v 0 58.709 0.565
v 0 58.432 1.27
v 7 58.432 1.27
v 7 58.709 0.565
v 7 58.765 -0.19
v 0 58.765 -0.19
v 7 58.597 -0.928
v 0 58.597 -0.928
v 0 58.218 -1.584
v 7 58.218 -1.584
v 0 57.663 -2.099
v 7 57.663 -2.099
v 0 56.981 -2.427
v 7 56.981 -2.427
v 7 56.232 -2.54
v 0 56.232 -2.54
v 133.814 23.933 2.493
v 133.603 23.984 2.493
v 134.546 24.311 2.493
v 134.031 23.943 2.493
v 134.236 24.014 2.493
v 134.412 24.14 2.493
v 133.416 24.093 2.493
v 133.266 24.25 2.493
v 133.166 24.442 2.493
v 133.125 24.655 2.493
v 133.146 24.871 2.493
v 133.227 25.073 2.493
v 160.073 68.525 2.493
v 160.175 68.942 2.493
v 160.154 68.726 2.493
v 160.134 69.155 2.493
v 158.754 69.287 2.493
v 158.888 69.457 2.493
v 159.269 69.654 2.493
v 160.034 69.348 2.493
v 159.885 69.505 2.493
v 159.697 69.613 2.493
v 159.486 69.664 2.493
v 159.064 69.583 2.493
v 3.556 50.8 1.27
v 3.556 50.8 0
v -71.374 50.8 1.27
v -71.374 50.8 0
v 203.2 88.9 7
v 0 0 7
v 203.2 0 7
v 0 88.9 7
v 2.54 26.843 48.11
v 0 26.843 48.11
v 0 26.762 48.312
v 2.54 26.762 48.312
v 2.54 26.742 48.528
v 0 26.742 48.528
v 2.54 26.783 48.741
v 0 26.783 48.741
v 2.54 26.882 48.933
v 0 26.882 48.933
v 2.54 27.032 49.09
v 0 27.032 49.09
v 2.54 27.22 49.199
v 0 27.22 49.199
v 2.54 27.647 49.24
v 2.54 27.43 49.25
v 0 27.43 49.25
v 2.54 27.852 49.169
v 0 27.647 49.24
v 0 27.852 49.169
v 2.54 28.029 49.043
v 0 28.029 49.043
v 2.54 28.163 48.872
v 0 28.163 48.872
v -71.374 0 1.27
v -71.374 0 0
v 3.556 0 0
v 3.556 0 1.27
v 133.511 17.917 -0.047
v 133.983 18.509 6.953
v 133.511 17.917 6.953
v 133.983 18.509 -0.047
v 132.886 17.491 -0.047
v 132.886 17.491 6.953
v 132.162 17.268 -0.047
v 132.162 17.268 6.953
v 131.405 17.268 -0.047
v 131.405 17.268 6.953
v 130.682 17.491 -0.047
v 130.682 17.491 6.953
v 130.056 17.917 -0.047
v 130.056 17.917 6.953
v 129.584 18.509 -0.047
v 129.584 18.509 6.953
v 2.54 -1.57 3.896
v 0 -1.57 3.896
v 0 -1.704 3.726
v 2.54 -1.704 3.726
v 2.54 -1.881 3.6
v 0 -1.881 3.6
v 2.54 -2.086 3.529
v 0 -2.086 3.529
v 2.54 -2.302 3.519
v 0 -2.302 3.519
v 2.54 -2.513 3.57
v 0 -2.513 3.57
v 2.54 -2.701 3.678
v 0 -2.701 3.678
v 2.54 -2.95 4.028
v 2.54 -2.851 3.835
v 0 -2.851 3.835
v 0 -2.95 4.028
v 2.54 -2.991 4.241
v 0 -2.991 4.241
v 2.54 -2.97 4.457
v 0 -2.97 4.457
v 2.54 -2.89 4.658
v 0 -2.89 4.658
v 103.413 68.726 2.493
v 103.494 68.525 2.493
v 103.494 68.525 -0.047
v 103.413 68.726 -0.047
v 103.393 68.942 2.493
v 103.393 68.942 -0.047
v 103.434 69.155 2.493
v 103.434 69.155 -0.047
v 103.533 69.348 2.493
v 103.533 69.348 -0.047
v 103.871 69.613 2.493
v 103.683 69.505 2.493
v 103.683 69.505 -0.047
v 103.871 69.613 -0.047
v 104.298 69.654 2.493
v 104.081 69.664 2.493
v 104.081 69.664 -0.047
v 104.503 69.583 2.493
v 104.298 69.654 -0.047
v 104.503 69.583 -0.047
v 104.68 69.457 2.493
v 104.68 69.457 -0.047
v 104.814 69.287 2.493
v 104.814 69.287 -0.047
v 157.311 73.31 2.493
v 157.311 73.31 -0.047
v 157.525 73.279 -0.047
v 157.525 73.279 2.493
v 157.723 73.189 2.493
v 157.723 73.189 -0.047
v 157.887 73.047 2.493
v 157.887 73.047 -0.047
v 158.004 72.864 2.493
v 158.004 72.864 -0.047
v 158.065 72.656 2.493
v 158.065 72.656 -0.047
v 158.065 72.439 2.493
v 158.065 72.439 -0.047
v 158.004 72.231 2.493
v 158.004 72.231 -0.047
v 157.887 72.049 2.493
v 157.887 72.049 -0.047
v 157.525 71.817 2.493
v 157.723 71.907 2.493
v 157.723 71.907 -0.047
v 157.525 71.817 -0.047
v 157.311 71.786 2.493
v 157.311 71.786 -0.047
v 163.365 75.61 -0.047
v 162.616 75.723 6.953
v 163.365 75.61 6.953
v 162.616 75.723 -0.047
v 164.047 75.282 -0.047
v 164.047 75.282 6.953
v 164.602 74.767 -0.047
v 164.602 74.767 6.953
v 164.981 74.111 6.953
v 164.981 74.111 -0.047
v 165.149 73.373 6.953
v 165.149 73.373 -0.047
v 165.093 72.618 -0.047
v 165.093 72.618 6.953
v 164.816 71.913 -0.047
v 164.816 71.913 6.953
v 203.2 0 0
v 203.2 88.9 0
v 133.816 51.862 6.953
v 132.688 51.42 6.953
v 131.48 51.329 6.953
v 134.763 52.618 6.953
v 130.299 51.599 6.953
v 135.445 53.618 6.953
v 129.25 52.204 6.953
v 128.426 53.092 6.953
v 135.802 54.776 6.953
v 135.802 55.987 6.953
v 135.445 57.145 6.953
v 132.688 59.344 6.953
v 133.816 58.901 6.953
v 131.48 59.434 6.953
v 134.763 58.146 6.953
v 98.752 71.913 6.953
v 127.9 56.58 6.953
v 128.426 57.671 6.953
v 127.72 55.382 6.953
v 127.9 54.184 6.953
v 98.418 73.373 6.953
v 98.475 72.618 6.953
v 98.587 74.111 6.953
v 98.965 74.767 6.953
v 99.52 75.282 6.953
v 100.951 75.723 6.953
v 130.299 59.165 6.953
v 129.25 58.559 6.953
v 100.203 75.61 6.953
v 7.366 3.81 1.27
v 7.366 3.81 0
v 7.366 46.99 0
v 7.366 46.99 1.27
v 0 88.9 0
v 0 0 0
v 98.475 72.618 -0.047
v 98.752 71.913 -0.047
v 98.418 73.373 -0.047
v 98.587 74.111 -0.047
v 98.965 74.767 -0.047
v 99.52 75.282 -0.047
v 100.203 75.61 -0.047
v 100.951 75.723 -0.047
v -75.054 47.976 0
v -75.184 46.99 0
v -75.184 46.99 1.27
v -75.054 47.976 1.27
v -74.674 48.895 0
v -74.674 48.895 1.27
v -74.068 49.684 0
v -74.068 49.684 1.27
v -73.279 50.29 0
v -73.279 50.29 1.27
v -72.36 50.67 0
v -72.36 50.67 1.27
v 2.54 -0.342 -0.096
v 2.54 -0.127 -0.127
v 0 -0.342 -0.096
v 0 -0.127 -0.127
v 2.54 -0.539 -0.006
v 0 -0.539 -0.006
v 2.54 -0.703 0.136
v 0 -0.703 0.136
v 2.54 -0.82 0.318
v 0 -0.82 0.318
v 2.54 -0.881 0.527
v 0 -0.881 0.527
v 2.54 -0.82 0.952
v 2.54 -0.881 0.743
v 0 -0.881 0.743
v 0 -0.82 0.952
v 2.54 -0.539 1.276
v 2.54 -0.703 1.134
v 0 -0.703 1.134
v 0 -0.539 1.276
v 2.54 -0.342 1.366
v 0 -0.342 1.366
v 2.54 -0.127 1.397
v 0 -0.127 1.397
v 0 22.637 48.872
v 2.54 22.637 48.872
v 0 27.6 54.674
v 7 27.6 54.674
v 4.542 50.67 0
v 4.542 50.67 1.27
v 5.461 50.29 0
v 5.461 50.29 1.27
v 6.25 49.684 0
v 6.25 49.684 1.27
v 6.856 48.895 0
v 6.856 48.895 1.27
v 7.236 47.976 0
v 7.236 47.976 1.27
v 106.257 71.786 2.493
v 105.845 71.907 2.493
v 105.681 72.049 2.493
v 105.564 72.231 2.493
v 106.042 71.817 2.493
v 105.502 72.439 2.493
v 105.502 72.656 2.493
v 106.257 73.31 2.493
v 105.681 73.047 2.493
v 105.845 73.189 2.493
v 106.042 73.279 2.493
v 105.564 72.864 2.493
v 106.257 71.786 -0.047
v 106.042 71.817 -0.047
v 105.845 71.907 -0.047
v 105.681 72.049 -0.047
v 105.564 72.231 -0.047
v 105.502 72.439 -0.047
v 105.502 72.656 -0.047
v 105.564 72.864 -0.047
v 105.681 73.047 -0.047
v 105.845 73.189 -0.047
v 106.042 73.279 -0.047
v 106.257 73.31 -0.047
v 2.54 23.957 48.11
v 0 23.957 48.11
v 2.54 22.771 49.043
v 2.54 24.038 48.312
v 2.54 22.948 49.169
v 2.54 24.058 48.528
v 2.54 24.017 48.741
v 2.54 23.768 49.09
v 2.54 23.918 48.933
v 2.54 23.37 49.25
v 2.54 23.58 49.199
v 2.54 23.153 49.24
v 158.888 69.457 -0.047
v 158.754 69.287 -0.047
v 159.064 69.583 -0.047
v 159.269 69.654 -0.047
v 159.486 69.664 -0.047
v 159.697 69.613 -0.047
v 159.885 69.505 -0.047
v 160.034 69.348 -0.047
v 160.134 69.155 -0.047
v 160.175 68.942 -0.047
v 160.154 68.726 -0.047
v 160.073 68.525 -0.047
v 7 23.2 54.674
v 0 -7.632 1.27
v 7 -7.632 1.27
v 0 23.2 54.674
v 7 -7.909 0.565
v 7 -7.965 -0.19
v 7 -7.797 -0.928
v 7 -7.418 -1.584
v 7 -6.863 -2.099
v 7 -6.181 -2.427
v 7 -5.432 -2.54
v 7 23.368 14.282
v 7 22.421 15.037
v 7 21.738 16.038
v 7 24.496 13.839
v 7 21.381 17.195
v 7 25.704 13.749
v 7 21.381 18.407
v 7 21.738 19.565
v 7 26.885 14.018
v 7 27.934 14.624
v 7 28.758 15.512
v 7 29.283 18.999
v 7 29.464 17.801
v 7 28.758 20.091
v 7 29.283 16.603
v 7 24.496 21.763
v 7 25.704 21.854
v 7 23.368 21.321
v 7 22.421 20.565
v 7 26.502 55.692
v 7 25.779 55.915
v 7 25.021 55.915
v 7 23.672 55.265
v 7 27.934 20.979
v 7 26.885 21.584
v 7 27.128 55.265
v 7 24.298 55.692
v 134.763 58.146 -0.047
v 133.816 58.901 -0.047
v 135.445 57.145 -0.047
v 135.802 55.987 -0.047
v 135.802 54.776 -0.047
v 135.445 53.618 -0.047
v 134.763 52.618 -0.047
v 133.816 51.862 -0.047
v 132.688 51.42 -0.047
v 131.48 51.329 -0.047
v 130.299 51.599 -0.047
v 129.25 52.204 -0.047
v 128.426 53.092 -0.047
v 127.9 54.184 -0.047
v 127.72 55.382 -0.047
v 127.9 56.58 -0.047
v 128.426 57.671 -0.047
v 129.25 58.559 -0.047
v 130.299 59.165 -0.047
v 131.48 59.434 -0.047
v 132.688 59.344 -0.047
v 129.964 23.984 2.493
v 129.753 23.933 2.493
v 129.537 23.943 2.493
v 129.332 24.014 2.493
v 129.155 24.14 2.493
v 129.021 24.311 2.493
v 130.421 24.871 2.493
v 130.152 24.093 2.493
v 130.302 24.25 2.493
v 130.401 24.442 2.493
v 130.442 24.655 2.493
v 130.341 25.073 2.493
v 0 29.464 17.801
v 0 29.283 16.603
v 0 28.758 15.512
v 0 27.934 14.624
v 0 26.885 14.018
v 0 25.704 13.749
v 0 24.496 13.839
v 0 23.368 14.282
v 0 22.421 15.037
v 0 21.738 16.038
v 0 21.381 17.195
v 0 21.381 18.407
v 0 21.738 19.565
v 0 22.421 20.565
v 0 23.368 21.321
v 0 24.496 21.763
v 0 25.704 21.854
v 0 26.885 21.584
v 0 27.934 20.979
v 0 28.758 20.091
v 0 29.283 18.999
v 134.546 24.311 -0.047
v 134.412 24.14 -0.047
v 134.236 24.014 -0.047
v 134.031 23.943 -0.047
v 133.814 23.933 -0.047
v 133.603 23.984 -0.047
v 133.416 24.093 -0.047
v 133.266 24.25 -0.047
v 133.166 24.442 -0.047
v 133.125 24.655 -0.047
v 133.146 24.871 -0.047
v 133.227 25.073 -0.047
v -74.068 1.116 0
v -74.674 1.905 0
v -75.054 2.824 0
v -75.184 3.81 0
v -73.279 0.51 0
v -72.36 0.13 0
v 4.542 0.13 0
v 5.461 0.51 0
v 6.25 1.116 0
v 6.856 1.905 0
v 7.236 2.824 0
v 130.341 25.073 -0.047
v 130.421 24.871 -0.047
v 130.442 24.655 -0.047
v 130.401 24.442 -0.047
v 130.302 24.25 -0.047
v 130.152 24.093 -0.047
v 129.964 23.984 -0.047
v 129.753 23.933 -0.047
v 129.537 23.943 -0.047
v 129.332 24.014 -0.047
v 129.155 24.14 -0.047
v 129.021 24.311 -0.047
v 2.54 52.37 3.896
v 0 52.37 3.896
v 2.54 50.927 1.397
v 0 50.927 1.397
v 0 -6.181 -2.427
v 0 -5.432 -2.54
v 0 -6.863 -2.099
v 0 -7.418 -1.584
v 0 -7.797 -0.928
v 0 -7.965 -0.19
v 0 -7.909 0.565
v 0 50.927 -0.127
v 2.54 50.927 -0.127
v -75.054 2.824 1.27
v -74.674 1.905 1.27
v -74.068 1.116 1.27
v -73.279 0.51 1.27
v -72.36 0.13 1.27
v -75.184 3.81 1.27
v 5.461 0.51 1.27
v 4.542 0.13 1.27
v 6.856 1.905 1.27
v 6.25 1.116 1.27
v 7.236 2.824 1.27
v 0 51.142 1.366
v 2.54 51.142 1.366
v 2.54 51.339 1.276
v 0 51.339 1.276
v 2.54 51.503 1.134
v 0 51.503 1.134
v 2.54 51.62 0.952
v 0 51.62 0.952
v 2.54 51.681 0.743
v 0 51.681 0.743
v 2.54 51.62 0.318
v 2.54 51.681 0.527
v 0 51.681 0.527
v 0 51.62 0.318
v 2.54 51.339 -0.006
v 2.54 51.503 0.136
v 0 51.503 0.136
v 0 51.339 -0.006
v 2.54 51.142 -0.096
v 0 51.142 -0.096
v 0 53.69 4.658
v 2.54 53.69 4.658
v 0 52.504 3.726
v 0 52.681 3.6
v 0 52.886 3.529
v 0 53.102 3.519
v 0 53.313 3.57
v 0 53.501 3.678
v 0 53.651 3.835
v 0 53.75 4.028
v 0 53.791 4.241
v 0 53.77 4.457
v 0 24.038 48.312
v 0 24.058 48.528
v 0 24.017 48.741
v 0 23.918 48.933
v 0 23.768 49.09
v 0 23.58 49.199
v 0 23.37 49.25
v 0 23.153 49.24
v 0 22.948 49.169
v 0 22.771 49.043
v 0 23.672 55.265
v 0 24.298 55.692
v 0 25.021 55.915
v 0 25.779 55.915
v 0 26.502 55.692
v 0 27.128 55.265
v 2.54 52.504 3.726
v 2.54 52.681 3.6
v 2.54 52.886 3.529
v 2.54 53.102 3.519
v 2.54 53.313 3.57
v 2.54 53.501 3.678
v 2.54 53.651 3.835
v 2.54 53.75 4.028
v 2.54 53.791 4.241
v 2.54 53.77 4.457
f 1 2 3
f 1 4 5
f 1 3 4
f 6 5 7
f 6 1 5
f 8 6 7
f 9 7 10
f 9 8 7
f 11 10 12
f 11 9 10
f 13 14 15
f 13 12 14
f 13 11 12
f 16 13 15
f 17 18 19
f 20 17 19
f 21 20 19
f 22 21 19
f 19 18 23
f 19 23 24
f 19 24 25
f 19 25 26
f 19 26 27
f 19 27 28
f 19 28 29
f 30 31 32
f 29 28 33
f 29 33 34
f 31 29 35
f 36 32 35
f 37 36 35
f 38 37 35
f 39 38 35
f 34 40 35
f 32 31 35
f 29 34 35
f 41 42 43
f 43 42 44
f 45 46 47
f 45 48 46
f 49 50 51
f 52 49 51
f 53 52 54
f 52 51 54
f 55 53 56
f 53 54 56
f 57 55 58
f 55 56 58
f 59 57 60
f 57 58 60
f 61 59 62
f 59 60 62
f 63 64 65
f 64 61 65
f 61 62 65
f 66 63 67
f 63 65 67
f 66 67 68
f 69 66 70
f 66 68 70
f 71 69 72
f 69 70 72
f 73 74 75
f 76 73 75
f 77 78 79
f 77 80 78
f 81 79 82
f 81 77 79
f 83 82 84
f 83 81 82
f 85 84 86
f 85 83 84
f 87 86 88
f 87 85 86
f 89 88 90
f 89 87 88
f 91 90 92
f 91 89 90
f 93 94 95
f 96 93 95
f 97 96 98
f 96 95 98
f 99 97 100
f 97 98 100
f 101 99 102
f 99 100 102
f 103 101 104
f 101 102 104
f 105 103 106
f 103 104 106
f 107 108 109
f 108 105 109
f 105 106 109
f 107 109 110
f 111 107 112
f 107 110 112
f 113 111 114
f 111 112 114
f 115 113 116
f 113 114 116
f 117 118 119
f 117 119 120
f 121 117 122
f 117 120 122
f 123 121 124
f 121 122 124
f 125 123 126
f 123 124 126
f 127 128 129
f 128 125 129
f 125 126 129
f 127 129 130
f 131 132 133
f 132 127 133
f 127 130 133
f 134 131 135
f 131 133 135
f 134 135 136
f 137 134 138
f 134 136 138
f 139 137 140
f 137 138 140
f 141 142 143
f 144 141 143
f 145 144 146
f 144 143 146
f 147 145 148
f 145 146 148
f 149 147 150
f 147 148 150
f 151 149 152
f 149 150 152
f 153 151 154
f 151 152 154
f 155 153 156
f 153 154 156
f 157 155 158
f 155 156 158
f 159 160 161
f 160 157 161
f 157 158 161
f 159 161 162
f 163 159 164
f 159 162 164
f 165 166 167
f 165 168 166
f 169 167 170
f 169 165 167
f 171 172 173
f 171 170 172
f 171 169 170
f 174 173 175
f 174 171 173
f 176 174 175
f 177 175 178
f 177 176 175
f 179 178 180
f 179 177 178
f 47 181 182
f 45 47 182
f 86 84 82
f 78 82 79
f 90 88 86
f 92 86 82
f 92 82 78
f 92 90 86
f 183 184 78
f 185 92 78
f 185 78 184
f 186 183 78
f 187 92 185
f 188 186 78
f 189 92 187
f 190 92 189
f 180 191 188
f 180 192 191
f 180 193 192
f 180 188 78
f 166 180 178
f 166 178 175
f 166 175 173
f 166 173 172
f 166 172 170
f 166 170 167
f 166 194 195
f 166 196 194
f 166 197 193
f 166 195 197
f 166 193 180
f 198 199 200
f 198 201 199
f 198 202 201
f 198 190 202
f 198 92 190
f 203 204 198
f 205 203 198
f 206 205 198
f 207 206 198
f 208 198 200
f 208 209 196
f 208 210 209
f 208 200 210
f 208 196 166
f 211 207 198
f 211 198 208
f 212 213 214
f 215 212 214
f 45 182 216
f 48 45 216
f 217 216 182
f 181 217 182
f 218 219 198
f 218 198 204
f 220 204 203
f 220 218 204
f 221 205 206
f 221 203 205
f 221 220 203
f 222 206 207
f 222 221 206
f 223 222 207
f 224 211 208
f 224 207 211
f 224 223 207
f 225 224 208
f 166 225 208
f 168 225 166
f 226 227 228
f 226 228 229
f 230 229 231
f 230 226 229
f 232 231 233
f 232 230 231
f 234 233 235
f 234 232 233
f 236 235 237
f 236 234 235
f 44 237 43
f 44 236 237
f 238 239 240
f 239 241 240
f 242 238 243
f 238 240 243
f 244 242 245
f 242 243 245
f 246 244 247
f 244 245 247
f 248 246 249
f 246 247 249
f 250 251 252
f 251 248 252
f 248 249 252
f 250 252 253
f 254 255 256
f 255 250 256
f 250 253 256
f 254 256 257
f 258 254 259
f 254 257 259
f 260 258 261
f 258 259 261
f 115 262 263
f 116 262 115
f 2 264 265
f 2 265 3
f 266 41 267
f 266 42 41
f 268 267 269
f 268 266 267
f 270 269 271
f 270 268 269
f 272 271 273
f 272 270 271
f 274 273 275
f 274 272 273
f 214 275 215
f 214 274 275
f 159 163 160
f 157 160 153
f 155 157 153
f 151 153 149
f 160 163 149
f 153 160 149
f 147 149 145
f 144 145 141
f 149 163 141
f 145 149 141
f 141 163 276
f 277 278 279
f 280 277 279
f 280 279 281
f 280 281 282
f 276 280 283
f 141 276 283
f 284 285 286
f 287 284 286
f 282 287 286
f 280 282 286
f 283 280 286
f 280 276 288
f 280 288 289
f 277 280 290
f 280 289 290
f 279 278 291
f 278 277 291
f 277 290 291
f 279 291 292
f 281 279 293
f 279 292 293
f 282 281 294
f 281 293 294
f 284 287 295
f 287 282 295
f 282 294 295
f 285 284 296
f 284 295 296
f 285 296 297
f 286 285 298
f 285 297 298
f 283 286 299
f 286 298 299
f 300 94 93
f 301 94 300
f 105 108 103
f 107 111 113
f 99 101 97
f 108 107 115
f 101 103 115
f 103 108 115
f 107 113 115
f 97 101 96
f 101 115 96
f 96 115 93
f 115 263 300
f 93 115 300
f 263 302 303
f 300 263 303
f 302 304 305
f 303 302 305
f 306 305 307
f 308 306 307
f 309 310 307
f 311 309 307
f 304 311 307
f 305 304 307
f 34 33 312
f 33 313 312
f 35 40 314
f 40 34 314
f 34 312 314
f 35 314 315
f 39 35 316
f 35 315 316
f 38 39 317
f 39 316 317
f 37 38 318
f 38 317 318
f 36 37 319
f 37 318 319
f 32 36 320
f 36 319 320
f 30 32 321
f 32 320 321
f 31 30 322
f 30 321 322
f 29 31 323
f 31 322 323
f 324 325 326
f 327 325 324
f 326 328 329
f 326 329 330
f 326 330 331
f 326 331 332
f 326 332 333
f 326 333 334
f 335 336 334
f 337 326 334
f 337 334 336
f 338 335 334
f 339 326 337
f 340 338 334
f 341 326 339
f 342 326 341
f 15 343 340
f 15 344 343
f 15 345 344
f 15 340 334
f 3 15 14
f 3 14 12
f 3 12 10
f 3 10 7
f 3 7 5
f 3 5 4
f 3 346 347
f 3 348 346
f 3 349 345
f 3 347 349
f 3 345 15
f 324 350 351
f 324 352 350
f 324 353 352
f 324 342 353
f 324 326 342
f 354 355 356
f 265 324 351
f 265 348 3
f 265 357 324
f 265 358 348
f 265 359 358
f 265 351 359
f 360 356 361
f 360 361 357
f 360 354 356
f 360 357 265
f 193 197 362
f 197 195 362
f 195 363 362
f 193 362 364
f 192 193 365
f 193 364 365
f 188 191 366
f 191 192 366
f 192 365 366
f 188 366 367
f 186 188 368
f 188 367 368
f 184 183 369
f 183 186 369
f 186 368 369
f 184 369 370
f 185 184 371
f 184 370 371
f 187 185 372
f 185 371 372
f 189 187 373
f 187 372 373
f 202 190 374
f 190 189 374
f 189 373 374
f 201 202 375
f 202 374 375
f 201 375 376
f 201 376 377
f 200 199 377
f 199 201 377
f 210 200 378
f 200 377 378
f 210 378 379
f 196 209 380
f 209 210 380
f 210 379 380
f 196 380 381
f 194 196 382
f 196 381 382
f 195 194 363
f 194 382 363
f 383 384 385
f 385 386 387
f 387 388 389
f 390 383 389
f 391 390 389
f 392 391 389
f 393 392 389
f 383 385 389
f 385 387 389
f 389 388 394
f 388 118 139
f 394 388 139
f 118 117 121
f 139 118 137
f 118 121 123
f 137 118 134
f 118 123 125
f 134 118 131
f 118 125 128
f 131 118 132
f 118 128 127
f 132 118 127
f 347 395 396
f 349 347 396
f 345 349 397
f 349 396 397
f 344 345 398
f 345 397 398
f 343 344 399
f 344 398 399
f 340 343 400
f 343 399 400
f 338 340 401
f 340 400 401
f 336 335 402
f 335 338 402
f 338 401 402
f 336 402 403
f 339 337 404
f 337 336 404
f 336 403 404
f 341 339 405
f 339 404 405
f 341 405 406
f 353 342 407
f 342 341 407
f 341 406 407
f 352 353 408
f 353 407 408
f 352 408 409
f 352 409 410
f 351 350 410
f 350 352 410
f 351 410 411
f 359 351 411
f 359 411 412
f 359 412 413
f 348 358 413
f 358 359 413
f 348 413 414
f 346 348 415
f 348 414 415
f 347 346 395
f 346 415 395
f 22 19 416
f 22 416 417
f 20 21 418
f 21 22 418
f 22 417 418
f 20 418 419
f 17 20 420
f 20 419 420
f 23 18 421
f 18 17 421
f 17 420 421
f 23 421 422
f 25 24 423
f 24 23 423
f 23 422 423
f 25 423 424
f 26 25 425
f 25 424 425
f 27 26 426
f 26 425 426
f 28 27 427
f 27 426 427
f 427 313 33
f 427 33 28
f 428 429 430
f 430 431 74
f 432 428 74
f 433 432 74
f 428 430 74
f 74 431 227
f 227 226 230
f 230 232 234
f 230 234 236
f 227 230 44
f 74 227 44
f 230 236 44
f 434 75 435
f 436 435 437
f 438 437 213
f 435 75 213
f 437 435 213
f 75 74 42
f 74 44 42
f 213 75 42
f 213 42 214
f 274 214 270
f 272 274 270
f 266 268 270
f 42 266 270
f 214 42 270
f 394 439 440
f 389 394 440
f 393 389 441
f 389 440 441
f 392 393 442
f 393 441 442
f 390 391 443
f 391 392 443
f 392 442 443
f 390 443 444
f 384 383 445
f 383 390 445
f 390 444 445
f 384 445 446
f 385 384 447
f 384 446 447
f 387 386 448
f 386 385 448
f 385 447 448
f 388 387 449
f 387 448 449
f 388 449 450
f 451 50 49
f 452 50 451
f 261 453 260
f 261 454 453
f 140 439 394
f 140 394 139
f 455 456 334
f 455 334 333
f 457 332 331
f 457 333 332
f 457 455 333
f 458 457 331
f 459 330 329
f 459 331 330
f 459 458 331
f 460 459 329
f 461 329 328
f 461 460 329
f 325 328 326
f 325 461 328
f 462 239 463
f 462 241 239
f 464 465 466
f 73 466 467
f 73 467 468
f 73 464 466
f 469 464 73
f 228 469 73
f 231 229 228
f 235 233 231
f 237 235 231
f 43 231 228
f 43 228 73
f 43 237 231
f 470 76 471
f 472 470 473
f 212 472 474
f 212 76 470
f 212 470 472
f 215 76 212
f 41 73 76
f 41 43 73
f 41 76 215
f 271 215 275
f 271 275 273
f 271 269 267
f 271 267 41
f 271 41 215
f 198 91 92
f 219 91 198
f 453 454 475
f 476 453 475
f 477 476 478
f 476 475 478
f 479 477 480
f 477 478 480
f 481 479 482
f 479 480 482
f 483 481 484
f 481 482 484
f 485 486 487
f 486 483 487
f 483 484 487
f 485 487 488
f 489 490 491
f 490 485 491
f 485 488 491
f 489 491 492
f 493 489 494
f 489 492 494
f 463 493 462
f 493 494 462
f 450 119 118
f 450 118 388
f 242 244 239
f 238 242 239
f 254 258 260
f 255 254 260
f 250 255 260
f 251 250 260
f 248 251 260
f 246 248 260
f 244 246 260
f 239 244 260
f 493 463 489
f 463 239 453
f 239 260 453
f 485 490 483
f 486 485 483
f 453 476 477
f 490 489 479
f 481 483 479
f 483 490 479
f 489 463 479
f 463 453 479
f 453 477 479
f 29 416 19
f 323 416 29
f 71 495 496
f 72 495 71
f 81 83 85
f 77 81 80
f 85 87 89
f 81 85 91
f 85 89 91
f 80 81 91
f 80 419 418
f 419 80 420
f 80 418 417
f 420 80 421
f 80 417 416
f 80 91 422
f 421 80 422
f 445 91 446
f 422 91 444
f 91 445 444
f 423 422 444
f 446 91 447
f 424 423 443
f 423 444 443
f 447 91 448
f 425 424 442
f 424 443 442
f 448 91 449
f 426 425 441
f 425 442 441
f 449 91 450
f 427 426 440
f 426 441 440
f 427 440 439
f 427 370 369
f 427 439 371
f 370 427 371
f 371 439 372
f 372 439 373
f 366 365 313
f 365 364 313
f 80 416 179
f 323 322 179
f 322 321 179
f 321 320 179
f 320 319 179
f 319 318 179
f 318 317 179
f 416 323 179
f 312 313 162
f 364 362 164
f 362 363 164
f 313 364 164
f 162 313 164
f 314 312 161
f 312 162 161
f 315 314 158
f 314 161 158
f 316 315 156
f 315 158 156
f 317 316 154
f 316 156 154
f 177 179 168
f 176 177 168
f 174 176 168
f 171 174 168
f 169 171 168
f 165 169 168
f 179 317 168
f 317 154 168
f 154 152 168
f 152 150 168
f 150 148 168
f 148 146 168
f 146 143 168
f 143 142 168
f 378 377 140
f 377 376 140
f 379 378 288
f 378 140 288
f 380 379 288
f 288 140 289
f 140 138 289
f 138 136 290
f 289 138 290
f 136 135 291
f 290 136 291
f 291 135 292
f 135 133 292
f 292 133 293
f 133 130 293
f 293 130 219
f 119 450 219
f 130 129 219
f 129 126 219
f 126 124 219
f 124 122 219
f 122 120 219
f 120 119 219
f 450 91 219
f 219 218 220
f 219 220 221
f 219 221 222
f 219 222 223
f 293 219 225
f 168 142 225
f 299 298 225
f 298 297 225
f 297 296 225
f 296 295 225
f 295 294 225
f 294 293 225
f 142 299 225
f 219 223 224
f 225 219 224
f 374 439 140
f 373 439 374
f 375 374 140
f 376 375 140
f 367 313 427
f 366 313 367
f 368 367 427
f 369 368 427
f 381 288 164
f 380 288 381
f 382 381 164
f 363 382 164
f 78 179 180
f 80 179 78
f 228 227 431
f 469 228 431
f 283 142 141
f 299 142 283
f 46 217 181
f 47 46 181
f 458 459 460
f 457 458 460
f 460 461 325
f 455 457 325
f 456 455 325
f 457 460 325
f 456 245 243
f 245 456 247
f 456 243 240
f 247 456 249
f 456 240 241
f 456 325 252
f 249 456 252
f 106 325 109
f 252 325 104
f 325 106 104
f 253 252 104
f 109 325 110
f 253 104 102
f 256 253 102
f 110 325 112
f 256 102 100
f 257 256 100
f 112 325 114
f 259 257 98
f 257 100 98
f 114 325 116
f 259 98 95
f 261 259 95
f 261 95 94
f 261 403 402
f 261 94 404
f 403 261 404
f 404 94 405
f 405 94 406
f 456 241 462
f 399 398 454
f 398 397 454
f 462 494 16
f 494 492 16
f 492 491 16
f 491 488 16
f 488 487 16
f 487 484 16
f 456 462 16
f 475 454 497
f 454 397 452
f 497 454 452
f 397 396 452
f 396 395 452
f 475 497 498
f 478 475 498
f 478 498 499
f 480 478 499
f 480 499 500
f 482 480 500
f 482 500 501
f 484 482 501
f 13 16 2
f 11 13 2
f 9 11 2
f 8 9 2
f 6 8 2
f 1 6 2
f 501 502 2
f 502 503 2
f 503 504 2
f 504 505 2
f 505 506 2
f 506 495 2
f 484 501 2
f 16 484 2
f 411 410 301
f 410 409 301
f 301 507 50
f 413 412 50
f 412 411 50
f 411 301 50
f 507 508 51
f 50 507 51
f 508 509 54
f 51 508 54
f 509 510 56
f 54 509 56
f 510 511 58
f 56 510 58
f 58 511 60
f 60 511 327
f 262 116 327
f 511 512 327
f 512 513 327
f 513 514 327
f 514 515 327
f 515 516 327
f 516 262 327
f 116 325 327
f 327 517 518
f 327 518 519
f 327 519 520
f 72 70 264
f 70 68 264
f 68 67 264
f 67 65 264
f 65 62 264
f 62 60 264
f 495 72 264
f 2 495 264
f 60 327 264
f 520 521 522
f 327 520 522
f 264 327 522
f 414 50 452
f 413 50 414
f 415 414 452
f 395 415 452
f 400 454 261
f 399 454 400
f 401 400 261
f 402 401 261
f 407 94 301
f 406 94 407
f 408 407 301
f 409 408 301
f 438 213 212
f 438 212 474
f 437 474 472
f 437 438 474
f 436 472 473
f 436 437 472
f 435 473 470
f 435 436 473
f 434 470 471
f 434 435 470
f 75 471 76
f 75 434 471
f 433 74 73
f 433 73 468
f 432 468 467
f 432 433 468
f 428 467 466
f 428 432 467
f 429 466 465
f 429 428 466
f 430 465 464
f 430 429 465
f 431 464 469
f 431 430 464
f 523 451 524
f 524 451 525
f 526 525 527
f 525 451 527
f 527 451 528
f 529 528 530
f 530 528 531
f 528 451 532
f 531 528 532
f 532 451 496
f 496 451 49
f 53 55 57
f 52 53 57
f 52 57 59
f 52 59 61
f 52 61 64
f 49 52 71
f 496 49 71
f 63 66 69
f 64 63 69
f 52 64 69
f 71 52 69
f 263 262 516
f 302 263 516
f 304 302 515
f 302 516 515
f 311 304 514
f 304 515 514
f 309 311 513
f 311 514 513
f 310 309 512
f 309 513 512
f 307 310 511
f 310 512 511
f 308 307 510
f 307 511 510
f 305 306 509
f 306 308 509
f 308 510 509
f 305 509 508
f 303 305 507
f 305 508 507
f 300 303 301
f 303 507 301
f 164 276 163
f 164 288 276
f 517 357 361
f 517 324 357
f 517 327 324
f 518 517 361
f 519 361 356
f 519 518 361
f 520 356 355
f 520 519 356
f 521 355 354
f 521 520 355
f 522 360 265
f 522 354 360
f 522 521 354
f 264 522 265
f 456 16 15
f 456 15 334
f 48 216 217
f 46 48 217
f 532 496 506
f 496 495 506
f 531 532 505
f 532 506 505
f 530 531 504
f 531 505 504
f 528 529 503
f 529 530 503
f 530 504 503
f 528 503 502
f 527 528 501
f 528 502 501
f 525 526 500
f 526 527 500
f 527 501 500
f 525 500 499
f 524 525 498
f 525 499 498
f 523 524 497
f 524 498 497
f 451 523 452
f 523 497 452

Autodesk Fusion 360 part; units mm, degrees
sketch "Sketch1" plane through (0, 0, 0) normal (0, 0, 1) x (1, 0, 0) in component "plate"
  line L0 (3.81, 0) -> (78.74, 0)
  line L1 (82.55, 3.81) -> (82.55, 46.99)
  line L2 (78.74, 50.8) -> (3.81, 50.8)
  line L3 (0, 46.99) -> (0, 3.81)
  arc A0 (3.81, 50.8) -> (0, 46.99) centre (3.81, 46.99) ccw
  arc A1 (82.55, 46.99) -> (78.74, 50.8) centre (78.74, 46.99) ccw
  arc A2 (78.74, 0) -> (82.55, 3.81) centre (78.74, 3.81) ccw
  arc A3 (0, 3.81) -> (3.81, 0) centre (3.81, 3.81) ccw
  point P0 (82.55, 0)
  point P1 (0, 50.8)
  dimension "d1" = 82.55
  dimension "d2" = 50.8
  dimension "d3" = 3.81
extrude "Extrude1" add sketch "Sketch1" along normal blind 1.27 makes body 1 in component "plate"
sketch "Sketch1 (2)" plane through (0, 0, 0) normal (1, 0, 0) x (0, 1, 0) in component "holder"
  line L0 (56.2325, -2.54) -> (-5.4325, -2.54)
  line L1 (-7.6322, 1.27) -> (23.2003, 54.6735)
  line L2 (27.5997, 54.6735) -> (58.4322, 1.27)
  line L3 (46.99, 0) -> (3.81, 0)
  line L4 (50.8, 0) -> (46.99, 0)
  line L5 (3.81, 0) -> (0, 0)
  line L6 (25.4, 0) -> (25.4, -2.54) construction
  line L7 (50.8, 1.27) -> (46.99, 1.27) construction
  line L8 (46.99, 1.27) -> (3.81, 1.27) construction
  line L9 (3.81, 1.27) -> (0, 1.27) construction
  line L10 (50.8, 1.27) -> (0, 1.27) construction
  line L11 (0, 1.27) -> (0, 0) construction
  line L12 (0, 0) -> (50.8, 0) construction
  line L13 (50.8, 0) -> (50.8, 1.27) construction
  line L14 (-0.127, -0.127) -> (50.927, -0.127)
  line L15 (50.927, -0.127) -> (50.927, 1.397) construction
  line L16 (50.927, 1.397) -> (-0.127, 1.397)
  line L17 (-0.127, 1.397) -> (-0.127, -0.127) construction
  arc A0 (27.5997, 54.6735) -> (23.2003, 54.6735) centre (25.4, 53.4035) ccw
  arc A1 (56.2325, -2.54) -> (58.4322, 1.27) centre (56.2325, 0) ccw
  arc A2 (-7.6322, 1.27) -> (-5.4325, -2.54) centre (-5.4325, 0) ccw
  arc A3 (50.927, -0.127) -> (50.927, 1.397) centre (50.927, 0.635) ccw
  arc A4 (-0.127, 1.397) -> (-0.127, -0.127) centre (-0.127, 0.635) ccw
  arc A5 (52.3699, 3.8962) -> (53.6897, 4.6582) centre (53.0298, 4.2772) ccw
  line L18 (53.6897, 4.6582) -> (28.1627, 48.8723)
  line L19 (26.8429, 48.1103) -> (52.3699, 3.8962)
  arc A6 (28.1627, 48.8723) -> (26.8429, 48.1103) centre (27.5028, 48.4913) ccw
  arc A7 (23.9571, 48.1103) -> (22.6373, 48.8723) centre (23.2972, 48.4913) ccw
  line L20 (22.6373, 48.8723) -> (-2.8897, 4.6582)
  line L21 (-1.5699, 3.8962) -> (23.9571, 48.1103)
  arc A8 (-2.8897, 4.6582) -> (-1.5699, 3.8962) centre (-2.2298, 4.2772) ccw
  circle A9 centre (25.4, 17.8012) radius 4.064
  line L22 (43.016, 27.9717) -> (18.9016, 14.0493) construction
  line L23 (7.784, 27.9717) -> (30.3338, 14.9526) construction
  line L24 (25.4, -2.54) -> (25.4, 29.45) construction
  point P0 (25.4, 17.8012)
  dimension "d7" = 2.54
  dimension "d8" = 0.127
  dimension "d11" = 2.54
  dimension "d12" = 2.54
  dimension "d13" = 2.54
  dimension "d15" = 360
  dimension "d16" = 8.128
extrude "Extrude1'" add sketch "Sketch1 (2)" along normal blind 7 separate body contours L0 L1 L2 A0 A1 A2 | L14 L16 A3 A4 | A5 L18 L19 A6 | A7 L20 L21 A8 makes body 2 in component "holder"
extrude "Extrude2" cut sketch "Sketch1 (2)" along normal blind 2.54 contours L14 L16 A3 A4 | A5 L18 L19 A6 | A7 L20 L21 A8 bodies 2 in component "holder"
copy_body "CutPasteBodies1" bodies 2 removing the originals makes body 3 in component "holder"
sketch "Sketch1 (3)" plane through (0, 0, 0) normal (0, 0, 1) x (1, 0, 0) in component "mdf"
  line L0 (0, 0) -> (203.2, 0)
  line L1 (203.2, 0) -> (203.2, 88.9)
  line L2 (203.2, 88.9) -> (0, 88.9)
  line L3 (0, 88.9) -> (0, 0)
  dimension "d21" = 203.2
  dimension "d22" = 88.9
extrude "Extrude1''" add sketch "Sketch1 (3)" along normal blind 7 separate body makes body 4 in component "mdf"
component "plate" placed x (1, 0, 0) y (0, 1, 0) z (0, 0, 1) at (-75.184, 0, 0)
component "holder" placed x (1, 0, 0) y (0, 1, 0) z (0, 0, 1) at (0, 0, 0)
component "mdf" placed x (1, 0, 0) y (0, 1, 0) z (0, 0, 1) at (0, 0, 0)
component "holder" placed x (0, 0, 1) y (0.5, 0.866025, 0) z (-0.866025, 0.5, 0) at (134.5, 24.4841, -0.0473)
